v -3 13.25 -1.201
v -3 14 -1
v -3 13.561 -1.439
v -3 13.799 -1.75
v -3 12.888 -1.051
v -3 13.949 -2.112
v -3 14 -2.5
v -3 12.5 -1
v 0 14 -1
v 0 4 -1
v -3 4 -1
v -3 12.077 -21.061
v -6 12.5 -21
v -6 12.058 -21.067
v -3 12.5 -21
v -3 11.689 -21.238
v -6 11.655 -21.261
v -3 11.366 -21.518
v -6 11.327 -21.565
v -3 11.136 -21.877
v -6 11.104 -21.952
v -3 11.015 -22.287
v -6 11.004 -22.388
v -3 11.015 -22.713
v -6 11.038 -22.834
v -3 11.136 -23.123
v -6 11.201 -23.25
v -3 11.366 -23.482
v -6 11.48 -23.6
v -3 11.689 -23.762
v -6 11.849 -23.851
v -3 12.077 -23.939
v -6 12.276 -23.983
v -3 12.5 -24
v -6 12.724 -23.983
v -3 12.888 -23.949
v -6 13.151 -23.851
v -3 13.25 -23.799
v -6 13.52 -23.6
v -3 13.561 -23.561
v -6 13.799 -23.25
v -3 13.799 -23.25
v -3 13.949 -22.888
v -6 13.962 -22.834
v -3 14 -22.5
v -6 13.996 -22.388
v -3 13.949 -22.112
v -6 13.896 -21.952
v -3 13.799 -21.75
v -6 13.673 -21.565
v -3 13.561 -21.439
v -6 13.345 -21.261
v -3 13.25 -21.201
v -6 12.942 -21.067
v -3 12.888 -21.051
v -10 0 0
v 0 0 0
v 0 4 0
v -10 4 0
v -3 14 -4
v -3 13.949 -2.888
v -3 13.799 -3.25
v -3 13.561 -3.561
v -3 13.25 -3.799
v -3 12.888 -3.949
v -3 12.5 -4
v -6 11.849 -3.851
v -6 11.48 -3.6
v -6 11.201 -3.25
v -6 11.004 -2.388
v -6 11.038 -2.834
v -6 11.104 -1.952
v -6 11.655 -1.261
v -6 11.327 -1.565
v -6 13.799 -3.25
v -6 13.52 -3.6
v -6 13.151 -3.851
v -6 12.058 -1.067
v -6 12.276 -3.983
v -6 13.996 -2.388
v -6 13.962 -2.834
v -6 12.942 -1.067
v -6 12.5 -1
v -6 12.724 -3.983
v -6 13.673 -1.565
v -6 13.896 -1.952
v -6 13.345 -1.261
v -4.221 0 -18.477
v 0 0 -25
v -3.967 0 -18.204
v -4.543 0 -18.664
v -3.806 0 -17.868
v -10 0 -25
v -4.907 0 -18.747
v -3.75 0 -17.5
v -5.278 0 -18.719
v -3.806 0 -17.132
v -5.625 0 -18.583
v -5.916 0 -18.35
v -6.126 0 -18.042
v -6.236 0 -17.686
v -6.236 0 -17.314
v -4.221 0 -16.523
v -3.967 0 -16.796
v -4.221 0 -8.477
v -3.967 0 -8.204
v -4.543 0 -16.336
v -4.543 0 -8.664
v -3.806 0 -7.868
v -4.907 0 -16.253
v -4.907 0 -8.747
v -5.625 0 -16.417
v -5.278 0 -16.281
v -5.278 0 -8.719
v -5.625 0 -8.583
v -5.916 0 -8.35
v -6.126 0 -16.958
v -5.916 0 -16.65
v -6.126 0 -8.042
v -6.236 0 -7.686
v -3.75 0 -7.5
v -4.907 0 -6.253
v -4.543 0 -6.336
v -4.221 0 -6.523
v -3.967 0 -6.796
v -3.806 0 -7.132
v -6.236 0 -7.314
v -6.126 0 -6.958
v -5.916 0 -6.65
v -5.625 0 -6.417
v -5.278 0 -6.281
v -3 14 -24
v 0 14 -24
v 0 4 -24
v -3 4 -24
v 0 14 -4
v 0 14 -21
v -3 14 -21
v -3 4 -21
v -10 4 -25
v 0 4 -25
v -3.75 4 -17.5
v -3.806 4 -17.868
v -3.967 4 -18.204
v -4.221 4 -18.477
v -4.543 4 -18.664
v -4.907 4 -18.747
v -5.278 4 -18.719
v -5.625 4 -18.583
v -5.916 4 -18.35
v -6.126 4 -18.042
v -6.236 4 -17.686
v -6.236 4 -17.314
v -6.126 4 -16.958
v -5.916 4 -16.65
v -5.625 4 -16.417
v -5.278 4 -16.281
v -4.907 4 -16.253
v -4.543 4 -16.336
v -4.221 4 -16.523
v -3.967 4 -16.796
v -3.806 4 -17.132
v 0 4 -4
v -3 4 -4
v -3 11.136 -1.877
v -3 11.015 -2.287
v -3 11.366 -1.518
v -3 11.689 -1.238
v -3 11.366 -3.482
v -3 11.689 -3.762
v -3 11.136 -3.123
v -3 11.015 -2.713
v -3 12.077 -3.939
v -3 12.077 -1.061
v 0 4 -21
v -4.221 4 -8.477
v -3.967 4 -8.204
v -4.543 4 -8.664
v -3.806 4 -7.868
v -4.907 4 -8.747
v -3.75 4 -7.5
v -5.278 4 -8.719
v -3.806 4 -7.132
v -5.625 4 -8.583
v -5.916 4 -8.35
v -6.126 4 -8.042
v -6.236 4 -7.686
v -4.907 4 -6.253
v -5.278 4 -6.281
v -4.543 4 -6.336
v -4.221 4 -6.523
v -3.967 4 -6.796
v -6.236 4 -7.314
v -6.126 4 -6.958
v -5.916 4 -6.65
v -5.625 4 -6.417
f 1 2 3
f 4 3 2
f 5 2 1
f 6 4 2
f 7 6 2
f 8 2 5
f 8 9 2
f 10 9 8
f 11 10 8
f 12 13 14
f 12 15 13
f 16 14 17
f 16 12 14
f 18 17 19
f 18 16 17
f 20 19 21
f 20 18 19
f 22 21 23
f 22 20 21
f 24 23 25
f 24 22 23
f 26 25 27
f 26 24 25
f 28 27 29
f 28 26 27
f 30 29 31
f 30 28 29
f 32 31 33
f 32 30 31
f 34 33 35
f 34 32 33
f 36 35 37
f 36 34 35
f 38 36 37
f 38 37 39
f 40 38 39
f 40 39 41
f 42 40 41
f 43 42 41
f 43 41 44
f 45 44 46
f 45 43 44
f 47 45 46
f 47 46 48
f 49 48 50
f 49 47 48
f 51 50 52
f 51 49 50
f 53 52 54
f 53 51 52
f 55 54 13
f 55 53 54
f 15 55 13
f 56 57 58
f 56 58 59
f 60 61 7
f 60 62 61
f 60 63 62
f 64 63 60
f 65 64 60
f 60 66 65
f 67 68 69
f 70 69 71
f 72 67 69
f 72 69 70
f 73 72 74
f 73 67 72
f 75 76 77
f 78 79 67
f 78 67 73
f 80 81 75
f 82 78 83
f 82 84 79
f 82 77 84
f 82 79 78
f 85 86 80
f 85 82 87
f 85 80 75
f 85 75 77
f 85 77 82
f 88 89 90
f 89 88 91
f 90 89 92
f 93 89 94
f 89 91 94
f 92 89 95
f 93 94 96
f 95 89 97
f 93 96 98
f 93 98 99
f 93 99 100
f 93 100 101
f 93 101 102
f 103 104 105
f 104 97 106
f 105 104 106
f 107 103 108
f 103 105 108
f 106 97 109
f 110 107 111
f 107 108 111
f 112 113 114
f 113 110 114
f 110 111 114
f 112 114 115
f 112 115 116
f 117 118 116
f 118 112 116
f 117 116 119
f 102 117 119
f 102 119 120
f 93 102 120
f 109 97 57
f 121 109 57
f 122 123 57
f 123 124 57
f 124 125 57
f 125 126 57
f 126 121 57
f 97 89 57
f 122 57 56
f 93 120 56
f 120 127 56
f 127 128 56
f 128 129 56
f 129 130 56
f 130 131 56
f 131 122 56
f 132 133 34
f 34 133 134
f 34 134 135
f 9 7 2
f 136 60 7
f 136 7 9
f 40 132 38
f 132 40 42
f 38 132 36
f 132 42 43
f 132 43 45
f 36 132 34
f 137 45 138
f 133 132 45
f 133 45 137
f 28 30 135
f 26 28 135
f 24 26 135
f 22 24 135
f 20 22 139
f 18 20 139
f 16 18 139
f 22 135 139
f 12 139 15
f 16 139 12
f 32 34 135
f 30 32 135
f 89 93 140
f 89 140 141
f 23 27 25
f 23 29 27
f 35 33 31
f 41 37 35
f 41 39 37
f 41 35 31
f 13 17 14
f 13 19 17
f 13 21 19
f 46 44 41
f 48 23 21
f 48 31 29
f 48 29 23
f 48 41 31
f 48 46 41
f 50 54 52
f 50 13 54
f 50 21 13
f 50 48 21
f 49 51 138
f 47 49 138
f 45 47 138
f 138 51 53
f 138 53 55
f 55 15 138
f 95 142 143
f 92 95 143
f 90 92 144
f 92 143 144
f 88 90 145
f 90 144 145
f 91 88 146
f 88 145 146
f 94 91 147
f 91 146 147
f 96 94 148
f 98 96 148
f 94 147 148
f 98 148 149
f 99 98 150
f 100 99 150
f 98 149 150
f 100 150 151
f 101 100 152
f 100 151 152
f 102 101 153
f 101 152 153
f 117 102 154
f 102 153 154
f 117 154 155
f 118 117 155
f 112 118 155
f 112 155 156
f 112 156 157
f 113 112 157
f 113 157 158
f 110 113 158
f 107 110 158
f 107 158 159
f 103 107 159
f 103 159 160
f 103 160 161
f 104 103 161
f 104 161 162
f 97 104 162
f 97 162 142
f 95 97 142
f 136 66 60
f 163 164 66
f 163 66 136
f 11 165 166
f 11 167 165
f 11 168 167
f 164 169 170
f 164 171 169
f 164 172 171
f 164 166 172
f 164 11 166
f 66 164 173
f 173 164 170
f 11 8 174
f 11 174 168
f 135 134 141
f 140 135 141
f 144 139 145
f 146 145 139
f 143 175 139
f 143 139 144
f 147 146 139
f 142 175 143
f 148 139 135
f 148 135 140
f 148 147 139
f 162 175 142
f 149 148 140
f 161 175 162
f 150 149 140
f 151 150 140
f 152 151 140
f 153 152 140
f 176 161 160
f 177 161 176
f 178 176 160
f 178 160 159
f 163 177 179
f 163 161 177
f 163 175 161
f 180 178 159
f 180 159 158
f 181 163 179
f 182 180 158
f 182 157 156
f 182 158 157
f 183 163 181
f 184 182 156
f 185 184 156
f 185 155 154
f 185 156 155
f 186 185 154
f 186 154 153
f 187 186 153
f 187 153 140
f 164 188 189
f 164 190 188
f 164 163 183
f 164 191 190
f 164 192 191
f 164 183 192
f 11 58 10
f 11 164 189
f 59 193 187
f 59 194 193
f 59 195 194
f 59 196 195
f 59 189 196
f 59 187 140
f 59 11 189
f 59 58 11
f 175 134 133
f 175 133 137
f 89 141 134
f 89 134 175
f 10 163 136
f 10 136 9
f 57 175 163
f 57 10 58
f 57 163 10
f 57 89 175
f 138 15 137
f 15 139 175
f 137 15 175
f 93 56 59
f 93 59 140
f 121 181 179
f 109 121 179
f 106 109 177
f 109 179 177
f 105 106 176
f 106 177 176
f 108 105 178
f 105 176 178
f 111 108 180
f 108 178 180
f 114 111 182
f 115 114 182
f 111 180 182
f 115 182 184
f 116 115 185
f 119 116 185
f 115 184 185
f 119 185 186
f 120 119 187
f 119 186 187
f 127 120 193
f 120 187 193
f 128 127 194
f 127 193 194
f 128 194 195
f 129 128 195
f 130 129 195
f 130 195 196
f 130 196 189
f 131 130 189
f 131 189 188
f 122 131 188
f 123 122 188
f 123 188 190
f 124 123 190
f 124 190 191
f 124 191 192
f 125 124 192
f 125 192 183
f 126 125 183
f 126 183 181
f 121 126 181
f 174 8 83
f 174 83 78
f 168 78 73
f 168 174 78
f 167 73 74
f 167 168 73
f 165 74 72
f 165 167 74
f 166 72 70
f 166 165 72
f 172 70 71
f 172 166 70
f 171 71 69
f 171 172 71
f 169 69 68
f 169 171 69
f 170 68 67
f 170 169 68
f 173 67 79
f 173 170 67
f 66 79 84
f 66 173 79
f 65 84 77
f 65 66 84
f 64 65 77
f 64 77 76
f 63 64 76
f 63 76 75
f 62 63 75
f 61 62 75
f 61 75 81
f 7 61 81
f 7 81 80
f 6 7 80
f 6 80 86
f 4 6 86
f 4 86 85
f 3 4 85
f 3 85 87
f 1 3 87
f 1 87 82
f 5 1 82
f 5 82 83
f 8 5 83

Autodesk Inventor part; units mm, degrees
ref_plane "YZ Plane" through (0, 0, 0) normal (1, 0, 0) x (0, 1, 0)
ref_plane "XZ Plane" through (0, 0, 0) normal (0, 1, 0) x (-1, 0, 0)
ref_plane "XY Plane" through (0, 0, 0) normal (0, 0, 1) x (1, 0, 0)
sketch "Sketch1" plane through (0, 0, 0) normal (0, 1, 0) x (-1, 0, 0)
  line L0 (0, 0) -> (10, 0)
  line L1 (10, 0) -> (10, -25)
  line L2 (10, -25) -> (0, -25)
  line L3 (0, -25) -> (0, 0)
  dimension "d0" = 10
  dimension "d1" = 25
extrude "Extrusion1" add sketch "Sketch1" along normal blind 4
sketch "Sketch2" plane through (0, 4, 0) normal (0, 1, 0) x (1, 0, 0)
  line L0 (0, 0) -> (0, 12.5)
  line L1 (0, 0) -> (0, 25) projected
  line L2 (0, 12.5) -> (0, 7.5)
  line L3 (0, 12.5) -> (0, 17.5)
  line L4 (0, 17.5) -> (-5, 17.5)
  line L5 (-10, 25) -> (-10, 0) projected
  circle A0 centre (-5, 17.5) radius 1.25
  line L6 (0, 7.5) -> (-5, 7.5)
  circle A1 centre (-5, 7.5) radius 1.25
  dimension "d4" = 12.5
  dimension "d5" = 5
  dimension "d6" = 5
  dimension "d7" = 5
  dimension "d8" = 2.5
  dimension "d9" = 5
  dimension "d10" = 2.5
extrude "Extrusion2" cut sketch "Sketch2" against normal blind 5
sketch "Sketch3" plane through (0, 4, 0) normal (0, 1, 0) x (1, 0, 0)
  line L0 (0, 25) -> (0, 0) projected
  line L1 (0, 25) -> (0, 24)
  line L2 (0, 24) -> (-3, 24)
  line L3 (-3, 24) -> (-3, 21)
  line L4 (-3, 21) -> (0, 21)
  line L5 (0, 21) -> (0, 24)
  line L6 (0, 0) -> (0, 1)
  line L7 (0, 1) -> (-3, 1)
  line L8 (-3, 1) -> (-3, 4)
  line L9 (-3, 4) -> (0, 4)
  line L10 (0, 4) -> (0, 1)
  dimension "d13" = 1
  dimension "d14" = 3
  dimension "d15" = 3
  dimension "d16" = 1
  dimension "d17" = 3
  dimension "d18" = 3
extrude "Extrusion3" add sketch "Sketch3" along normal blind 10
sketch "Sketch4" plane through (-3, 4, -24) normal (-1, 0, 0) x (0, 0, 1)
  line L0 (0, 0) -> (0, 10) projected
  line L1 (0, 10) -> (1.5, 10)
  line L2 (1.5, 10) -> (1.5, 8.5)
  line L3 (1.5, 8.5) -> (0, 8.5)
  line L4 (0, 8.5) -> (0, 10)
  circle A0 centre (1.5, 8.5) radius 1.5
  line L5 (23, 10) -> (20, 10) projected
  line L6 (23, 10) -> (21.5, 10)
  line L7 (21.5, 10) -> (21.5, 8.5)
  line L8 (21.5, 8.5) -> (23, 8.5)
  line L9 (23, 8.5) -> (23, 10)
  circle A1 centre (21.5, 8.5) radius 1.5
  point P0 (24, -4)
  dimension "d21" = 1.5
  dimension "d22" = 1.5
  dimension "d23" = 3
  dimension "d24" = 1.5
  dimension "d25" = 1.5
  dimension "d26" = 3
extrude "Extrusion4" add sketch "Sketch4" along normal blind 3 contours A0 L2 L3 | L3 L2 A0 | A1 L8 L7 | L7 L8 A1
properties part number "LaserMount"
